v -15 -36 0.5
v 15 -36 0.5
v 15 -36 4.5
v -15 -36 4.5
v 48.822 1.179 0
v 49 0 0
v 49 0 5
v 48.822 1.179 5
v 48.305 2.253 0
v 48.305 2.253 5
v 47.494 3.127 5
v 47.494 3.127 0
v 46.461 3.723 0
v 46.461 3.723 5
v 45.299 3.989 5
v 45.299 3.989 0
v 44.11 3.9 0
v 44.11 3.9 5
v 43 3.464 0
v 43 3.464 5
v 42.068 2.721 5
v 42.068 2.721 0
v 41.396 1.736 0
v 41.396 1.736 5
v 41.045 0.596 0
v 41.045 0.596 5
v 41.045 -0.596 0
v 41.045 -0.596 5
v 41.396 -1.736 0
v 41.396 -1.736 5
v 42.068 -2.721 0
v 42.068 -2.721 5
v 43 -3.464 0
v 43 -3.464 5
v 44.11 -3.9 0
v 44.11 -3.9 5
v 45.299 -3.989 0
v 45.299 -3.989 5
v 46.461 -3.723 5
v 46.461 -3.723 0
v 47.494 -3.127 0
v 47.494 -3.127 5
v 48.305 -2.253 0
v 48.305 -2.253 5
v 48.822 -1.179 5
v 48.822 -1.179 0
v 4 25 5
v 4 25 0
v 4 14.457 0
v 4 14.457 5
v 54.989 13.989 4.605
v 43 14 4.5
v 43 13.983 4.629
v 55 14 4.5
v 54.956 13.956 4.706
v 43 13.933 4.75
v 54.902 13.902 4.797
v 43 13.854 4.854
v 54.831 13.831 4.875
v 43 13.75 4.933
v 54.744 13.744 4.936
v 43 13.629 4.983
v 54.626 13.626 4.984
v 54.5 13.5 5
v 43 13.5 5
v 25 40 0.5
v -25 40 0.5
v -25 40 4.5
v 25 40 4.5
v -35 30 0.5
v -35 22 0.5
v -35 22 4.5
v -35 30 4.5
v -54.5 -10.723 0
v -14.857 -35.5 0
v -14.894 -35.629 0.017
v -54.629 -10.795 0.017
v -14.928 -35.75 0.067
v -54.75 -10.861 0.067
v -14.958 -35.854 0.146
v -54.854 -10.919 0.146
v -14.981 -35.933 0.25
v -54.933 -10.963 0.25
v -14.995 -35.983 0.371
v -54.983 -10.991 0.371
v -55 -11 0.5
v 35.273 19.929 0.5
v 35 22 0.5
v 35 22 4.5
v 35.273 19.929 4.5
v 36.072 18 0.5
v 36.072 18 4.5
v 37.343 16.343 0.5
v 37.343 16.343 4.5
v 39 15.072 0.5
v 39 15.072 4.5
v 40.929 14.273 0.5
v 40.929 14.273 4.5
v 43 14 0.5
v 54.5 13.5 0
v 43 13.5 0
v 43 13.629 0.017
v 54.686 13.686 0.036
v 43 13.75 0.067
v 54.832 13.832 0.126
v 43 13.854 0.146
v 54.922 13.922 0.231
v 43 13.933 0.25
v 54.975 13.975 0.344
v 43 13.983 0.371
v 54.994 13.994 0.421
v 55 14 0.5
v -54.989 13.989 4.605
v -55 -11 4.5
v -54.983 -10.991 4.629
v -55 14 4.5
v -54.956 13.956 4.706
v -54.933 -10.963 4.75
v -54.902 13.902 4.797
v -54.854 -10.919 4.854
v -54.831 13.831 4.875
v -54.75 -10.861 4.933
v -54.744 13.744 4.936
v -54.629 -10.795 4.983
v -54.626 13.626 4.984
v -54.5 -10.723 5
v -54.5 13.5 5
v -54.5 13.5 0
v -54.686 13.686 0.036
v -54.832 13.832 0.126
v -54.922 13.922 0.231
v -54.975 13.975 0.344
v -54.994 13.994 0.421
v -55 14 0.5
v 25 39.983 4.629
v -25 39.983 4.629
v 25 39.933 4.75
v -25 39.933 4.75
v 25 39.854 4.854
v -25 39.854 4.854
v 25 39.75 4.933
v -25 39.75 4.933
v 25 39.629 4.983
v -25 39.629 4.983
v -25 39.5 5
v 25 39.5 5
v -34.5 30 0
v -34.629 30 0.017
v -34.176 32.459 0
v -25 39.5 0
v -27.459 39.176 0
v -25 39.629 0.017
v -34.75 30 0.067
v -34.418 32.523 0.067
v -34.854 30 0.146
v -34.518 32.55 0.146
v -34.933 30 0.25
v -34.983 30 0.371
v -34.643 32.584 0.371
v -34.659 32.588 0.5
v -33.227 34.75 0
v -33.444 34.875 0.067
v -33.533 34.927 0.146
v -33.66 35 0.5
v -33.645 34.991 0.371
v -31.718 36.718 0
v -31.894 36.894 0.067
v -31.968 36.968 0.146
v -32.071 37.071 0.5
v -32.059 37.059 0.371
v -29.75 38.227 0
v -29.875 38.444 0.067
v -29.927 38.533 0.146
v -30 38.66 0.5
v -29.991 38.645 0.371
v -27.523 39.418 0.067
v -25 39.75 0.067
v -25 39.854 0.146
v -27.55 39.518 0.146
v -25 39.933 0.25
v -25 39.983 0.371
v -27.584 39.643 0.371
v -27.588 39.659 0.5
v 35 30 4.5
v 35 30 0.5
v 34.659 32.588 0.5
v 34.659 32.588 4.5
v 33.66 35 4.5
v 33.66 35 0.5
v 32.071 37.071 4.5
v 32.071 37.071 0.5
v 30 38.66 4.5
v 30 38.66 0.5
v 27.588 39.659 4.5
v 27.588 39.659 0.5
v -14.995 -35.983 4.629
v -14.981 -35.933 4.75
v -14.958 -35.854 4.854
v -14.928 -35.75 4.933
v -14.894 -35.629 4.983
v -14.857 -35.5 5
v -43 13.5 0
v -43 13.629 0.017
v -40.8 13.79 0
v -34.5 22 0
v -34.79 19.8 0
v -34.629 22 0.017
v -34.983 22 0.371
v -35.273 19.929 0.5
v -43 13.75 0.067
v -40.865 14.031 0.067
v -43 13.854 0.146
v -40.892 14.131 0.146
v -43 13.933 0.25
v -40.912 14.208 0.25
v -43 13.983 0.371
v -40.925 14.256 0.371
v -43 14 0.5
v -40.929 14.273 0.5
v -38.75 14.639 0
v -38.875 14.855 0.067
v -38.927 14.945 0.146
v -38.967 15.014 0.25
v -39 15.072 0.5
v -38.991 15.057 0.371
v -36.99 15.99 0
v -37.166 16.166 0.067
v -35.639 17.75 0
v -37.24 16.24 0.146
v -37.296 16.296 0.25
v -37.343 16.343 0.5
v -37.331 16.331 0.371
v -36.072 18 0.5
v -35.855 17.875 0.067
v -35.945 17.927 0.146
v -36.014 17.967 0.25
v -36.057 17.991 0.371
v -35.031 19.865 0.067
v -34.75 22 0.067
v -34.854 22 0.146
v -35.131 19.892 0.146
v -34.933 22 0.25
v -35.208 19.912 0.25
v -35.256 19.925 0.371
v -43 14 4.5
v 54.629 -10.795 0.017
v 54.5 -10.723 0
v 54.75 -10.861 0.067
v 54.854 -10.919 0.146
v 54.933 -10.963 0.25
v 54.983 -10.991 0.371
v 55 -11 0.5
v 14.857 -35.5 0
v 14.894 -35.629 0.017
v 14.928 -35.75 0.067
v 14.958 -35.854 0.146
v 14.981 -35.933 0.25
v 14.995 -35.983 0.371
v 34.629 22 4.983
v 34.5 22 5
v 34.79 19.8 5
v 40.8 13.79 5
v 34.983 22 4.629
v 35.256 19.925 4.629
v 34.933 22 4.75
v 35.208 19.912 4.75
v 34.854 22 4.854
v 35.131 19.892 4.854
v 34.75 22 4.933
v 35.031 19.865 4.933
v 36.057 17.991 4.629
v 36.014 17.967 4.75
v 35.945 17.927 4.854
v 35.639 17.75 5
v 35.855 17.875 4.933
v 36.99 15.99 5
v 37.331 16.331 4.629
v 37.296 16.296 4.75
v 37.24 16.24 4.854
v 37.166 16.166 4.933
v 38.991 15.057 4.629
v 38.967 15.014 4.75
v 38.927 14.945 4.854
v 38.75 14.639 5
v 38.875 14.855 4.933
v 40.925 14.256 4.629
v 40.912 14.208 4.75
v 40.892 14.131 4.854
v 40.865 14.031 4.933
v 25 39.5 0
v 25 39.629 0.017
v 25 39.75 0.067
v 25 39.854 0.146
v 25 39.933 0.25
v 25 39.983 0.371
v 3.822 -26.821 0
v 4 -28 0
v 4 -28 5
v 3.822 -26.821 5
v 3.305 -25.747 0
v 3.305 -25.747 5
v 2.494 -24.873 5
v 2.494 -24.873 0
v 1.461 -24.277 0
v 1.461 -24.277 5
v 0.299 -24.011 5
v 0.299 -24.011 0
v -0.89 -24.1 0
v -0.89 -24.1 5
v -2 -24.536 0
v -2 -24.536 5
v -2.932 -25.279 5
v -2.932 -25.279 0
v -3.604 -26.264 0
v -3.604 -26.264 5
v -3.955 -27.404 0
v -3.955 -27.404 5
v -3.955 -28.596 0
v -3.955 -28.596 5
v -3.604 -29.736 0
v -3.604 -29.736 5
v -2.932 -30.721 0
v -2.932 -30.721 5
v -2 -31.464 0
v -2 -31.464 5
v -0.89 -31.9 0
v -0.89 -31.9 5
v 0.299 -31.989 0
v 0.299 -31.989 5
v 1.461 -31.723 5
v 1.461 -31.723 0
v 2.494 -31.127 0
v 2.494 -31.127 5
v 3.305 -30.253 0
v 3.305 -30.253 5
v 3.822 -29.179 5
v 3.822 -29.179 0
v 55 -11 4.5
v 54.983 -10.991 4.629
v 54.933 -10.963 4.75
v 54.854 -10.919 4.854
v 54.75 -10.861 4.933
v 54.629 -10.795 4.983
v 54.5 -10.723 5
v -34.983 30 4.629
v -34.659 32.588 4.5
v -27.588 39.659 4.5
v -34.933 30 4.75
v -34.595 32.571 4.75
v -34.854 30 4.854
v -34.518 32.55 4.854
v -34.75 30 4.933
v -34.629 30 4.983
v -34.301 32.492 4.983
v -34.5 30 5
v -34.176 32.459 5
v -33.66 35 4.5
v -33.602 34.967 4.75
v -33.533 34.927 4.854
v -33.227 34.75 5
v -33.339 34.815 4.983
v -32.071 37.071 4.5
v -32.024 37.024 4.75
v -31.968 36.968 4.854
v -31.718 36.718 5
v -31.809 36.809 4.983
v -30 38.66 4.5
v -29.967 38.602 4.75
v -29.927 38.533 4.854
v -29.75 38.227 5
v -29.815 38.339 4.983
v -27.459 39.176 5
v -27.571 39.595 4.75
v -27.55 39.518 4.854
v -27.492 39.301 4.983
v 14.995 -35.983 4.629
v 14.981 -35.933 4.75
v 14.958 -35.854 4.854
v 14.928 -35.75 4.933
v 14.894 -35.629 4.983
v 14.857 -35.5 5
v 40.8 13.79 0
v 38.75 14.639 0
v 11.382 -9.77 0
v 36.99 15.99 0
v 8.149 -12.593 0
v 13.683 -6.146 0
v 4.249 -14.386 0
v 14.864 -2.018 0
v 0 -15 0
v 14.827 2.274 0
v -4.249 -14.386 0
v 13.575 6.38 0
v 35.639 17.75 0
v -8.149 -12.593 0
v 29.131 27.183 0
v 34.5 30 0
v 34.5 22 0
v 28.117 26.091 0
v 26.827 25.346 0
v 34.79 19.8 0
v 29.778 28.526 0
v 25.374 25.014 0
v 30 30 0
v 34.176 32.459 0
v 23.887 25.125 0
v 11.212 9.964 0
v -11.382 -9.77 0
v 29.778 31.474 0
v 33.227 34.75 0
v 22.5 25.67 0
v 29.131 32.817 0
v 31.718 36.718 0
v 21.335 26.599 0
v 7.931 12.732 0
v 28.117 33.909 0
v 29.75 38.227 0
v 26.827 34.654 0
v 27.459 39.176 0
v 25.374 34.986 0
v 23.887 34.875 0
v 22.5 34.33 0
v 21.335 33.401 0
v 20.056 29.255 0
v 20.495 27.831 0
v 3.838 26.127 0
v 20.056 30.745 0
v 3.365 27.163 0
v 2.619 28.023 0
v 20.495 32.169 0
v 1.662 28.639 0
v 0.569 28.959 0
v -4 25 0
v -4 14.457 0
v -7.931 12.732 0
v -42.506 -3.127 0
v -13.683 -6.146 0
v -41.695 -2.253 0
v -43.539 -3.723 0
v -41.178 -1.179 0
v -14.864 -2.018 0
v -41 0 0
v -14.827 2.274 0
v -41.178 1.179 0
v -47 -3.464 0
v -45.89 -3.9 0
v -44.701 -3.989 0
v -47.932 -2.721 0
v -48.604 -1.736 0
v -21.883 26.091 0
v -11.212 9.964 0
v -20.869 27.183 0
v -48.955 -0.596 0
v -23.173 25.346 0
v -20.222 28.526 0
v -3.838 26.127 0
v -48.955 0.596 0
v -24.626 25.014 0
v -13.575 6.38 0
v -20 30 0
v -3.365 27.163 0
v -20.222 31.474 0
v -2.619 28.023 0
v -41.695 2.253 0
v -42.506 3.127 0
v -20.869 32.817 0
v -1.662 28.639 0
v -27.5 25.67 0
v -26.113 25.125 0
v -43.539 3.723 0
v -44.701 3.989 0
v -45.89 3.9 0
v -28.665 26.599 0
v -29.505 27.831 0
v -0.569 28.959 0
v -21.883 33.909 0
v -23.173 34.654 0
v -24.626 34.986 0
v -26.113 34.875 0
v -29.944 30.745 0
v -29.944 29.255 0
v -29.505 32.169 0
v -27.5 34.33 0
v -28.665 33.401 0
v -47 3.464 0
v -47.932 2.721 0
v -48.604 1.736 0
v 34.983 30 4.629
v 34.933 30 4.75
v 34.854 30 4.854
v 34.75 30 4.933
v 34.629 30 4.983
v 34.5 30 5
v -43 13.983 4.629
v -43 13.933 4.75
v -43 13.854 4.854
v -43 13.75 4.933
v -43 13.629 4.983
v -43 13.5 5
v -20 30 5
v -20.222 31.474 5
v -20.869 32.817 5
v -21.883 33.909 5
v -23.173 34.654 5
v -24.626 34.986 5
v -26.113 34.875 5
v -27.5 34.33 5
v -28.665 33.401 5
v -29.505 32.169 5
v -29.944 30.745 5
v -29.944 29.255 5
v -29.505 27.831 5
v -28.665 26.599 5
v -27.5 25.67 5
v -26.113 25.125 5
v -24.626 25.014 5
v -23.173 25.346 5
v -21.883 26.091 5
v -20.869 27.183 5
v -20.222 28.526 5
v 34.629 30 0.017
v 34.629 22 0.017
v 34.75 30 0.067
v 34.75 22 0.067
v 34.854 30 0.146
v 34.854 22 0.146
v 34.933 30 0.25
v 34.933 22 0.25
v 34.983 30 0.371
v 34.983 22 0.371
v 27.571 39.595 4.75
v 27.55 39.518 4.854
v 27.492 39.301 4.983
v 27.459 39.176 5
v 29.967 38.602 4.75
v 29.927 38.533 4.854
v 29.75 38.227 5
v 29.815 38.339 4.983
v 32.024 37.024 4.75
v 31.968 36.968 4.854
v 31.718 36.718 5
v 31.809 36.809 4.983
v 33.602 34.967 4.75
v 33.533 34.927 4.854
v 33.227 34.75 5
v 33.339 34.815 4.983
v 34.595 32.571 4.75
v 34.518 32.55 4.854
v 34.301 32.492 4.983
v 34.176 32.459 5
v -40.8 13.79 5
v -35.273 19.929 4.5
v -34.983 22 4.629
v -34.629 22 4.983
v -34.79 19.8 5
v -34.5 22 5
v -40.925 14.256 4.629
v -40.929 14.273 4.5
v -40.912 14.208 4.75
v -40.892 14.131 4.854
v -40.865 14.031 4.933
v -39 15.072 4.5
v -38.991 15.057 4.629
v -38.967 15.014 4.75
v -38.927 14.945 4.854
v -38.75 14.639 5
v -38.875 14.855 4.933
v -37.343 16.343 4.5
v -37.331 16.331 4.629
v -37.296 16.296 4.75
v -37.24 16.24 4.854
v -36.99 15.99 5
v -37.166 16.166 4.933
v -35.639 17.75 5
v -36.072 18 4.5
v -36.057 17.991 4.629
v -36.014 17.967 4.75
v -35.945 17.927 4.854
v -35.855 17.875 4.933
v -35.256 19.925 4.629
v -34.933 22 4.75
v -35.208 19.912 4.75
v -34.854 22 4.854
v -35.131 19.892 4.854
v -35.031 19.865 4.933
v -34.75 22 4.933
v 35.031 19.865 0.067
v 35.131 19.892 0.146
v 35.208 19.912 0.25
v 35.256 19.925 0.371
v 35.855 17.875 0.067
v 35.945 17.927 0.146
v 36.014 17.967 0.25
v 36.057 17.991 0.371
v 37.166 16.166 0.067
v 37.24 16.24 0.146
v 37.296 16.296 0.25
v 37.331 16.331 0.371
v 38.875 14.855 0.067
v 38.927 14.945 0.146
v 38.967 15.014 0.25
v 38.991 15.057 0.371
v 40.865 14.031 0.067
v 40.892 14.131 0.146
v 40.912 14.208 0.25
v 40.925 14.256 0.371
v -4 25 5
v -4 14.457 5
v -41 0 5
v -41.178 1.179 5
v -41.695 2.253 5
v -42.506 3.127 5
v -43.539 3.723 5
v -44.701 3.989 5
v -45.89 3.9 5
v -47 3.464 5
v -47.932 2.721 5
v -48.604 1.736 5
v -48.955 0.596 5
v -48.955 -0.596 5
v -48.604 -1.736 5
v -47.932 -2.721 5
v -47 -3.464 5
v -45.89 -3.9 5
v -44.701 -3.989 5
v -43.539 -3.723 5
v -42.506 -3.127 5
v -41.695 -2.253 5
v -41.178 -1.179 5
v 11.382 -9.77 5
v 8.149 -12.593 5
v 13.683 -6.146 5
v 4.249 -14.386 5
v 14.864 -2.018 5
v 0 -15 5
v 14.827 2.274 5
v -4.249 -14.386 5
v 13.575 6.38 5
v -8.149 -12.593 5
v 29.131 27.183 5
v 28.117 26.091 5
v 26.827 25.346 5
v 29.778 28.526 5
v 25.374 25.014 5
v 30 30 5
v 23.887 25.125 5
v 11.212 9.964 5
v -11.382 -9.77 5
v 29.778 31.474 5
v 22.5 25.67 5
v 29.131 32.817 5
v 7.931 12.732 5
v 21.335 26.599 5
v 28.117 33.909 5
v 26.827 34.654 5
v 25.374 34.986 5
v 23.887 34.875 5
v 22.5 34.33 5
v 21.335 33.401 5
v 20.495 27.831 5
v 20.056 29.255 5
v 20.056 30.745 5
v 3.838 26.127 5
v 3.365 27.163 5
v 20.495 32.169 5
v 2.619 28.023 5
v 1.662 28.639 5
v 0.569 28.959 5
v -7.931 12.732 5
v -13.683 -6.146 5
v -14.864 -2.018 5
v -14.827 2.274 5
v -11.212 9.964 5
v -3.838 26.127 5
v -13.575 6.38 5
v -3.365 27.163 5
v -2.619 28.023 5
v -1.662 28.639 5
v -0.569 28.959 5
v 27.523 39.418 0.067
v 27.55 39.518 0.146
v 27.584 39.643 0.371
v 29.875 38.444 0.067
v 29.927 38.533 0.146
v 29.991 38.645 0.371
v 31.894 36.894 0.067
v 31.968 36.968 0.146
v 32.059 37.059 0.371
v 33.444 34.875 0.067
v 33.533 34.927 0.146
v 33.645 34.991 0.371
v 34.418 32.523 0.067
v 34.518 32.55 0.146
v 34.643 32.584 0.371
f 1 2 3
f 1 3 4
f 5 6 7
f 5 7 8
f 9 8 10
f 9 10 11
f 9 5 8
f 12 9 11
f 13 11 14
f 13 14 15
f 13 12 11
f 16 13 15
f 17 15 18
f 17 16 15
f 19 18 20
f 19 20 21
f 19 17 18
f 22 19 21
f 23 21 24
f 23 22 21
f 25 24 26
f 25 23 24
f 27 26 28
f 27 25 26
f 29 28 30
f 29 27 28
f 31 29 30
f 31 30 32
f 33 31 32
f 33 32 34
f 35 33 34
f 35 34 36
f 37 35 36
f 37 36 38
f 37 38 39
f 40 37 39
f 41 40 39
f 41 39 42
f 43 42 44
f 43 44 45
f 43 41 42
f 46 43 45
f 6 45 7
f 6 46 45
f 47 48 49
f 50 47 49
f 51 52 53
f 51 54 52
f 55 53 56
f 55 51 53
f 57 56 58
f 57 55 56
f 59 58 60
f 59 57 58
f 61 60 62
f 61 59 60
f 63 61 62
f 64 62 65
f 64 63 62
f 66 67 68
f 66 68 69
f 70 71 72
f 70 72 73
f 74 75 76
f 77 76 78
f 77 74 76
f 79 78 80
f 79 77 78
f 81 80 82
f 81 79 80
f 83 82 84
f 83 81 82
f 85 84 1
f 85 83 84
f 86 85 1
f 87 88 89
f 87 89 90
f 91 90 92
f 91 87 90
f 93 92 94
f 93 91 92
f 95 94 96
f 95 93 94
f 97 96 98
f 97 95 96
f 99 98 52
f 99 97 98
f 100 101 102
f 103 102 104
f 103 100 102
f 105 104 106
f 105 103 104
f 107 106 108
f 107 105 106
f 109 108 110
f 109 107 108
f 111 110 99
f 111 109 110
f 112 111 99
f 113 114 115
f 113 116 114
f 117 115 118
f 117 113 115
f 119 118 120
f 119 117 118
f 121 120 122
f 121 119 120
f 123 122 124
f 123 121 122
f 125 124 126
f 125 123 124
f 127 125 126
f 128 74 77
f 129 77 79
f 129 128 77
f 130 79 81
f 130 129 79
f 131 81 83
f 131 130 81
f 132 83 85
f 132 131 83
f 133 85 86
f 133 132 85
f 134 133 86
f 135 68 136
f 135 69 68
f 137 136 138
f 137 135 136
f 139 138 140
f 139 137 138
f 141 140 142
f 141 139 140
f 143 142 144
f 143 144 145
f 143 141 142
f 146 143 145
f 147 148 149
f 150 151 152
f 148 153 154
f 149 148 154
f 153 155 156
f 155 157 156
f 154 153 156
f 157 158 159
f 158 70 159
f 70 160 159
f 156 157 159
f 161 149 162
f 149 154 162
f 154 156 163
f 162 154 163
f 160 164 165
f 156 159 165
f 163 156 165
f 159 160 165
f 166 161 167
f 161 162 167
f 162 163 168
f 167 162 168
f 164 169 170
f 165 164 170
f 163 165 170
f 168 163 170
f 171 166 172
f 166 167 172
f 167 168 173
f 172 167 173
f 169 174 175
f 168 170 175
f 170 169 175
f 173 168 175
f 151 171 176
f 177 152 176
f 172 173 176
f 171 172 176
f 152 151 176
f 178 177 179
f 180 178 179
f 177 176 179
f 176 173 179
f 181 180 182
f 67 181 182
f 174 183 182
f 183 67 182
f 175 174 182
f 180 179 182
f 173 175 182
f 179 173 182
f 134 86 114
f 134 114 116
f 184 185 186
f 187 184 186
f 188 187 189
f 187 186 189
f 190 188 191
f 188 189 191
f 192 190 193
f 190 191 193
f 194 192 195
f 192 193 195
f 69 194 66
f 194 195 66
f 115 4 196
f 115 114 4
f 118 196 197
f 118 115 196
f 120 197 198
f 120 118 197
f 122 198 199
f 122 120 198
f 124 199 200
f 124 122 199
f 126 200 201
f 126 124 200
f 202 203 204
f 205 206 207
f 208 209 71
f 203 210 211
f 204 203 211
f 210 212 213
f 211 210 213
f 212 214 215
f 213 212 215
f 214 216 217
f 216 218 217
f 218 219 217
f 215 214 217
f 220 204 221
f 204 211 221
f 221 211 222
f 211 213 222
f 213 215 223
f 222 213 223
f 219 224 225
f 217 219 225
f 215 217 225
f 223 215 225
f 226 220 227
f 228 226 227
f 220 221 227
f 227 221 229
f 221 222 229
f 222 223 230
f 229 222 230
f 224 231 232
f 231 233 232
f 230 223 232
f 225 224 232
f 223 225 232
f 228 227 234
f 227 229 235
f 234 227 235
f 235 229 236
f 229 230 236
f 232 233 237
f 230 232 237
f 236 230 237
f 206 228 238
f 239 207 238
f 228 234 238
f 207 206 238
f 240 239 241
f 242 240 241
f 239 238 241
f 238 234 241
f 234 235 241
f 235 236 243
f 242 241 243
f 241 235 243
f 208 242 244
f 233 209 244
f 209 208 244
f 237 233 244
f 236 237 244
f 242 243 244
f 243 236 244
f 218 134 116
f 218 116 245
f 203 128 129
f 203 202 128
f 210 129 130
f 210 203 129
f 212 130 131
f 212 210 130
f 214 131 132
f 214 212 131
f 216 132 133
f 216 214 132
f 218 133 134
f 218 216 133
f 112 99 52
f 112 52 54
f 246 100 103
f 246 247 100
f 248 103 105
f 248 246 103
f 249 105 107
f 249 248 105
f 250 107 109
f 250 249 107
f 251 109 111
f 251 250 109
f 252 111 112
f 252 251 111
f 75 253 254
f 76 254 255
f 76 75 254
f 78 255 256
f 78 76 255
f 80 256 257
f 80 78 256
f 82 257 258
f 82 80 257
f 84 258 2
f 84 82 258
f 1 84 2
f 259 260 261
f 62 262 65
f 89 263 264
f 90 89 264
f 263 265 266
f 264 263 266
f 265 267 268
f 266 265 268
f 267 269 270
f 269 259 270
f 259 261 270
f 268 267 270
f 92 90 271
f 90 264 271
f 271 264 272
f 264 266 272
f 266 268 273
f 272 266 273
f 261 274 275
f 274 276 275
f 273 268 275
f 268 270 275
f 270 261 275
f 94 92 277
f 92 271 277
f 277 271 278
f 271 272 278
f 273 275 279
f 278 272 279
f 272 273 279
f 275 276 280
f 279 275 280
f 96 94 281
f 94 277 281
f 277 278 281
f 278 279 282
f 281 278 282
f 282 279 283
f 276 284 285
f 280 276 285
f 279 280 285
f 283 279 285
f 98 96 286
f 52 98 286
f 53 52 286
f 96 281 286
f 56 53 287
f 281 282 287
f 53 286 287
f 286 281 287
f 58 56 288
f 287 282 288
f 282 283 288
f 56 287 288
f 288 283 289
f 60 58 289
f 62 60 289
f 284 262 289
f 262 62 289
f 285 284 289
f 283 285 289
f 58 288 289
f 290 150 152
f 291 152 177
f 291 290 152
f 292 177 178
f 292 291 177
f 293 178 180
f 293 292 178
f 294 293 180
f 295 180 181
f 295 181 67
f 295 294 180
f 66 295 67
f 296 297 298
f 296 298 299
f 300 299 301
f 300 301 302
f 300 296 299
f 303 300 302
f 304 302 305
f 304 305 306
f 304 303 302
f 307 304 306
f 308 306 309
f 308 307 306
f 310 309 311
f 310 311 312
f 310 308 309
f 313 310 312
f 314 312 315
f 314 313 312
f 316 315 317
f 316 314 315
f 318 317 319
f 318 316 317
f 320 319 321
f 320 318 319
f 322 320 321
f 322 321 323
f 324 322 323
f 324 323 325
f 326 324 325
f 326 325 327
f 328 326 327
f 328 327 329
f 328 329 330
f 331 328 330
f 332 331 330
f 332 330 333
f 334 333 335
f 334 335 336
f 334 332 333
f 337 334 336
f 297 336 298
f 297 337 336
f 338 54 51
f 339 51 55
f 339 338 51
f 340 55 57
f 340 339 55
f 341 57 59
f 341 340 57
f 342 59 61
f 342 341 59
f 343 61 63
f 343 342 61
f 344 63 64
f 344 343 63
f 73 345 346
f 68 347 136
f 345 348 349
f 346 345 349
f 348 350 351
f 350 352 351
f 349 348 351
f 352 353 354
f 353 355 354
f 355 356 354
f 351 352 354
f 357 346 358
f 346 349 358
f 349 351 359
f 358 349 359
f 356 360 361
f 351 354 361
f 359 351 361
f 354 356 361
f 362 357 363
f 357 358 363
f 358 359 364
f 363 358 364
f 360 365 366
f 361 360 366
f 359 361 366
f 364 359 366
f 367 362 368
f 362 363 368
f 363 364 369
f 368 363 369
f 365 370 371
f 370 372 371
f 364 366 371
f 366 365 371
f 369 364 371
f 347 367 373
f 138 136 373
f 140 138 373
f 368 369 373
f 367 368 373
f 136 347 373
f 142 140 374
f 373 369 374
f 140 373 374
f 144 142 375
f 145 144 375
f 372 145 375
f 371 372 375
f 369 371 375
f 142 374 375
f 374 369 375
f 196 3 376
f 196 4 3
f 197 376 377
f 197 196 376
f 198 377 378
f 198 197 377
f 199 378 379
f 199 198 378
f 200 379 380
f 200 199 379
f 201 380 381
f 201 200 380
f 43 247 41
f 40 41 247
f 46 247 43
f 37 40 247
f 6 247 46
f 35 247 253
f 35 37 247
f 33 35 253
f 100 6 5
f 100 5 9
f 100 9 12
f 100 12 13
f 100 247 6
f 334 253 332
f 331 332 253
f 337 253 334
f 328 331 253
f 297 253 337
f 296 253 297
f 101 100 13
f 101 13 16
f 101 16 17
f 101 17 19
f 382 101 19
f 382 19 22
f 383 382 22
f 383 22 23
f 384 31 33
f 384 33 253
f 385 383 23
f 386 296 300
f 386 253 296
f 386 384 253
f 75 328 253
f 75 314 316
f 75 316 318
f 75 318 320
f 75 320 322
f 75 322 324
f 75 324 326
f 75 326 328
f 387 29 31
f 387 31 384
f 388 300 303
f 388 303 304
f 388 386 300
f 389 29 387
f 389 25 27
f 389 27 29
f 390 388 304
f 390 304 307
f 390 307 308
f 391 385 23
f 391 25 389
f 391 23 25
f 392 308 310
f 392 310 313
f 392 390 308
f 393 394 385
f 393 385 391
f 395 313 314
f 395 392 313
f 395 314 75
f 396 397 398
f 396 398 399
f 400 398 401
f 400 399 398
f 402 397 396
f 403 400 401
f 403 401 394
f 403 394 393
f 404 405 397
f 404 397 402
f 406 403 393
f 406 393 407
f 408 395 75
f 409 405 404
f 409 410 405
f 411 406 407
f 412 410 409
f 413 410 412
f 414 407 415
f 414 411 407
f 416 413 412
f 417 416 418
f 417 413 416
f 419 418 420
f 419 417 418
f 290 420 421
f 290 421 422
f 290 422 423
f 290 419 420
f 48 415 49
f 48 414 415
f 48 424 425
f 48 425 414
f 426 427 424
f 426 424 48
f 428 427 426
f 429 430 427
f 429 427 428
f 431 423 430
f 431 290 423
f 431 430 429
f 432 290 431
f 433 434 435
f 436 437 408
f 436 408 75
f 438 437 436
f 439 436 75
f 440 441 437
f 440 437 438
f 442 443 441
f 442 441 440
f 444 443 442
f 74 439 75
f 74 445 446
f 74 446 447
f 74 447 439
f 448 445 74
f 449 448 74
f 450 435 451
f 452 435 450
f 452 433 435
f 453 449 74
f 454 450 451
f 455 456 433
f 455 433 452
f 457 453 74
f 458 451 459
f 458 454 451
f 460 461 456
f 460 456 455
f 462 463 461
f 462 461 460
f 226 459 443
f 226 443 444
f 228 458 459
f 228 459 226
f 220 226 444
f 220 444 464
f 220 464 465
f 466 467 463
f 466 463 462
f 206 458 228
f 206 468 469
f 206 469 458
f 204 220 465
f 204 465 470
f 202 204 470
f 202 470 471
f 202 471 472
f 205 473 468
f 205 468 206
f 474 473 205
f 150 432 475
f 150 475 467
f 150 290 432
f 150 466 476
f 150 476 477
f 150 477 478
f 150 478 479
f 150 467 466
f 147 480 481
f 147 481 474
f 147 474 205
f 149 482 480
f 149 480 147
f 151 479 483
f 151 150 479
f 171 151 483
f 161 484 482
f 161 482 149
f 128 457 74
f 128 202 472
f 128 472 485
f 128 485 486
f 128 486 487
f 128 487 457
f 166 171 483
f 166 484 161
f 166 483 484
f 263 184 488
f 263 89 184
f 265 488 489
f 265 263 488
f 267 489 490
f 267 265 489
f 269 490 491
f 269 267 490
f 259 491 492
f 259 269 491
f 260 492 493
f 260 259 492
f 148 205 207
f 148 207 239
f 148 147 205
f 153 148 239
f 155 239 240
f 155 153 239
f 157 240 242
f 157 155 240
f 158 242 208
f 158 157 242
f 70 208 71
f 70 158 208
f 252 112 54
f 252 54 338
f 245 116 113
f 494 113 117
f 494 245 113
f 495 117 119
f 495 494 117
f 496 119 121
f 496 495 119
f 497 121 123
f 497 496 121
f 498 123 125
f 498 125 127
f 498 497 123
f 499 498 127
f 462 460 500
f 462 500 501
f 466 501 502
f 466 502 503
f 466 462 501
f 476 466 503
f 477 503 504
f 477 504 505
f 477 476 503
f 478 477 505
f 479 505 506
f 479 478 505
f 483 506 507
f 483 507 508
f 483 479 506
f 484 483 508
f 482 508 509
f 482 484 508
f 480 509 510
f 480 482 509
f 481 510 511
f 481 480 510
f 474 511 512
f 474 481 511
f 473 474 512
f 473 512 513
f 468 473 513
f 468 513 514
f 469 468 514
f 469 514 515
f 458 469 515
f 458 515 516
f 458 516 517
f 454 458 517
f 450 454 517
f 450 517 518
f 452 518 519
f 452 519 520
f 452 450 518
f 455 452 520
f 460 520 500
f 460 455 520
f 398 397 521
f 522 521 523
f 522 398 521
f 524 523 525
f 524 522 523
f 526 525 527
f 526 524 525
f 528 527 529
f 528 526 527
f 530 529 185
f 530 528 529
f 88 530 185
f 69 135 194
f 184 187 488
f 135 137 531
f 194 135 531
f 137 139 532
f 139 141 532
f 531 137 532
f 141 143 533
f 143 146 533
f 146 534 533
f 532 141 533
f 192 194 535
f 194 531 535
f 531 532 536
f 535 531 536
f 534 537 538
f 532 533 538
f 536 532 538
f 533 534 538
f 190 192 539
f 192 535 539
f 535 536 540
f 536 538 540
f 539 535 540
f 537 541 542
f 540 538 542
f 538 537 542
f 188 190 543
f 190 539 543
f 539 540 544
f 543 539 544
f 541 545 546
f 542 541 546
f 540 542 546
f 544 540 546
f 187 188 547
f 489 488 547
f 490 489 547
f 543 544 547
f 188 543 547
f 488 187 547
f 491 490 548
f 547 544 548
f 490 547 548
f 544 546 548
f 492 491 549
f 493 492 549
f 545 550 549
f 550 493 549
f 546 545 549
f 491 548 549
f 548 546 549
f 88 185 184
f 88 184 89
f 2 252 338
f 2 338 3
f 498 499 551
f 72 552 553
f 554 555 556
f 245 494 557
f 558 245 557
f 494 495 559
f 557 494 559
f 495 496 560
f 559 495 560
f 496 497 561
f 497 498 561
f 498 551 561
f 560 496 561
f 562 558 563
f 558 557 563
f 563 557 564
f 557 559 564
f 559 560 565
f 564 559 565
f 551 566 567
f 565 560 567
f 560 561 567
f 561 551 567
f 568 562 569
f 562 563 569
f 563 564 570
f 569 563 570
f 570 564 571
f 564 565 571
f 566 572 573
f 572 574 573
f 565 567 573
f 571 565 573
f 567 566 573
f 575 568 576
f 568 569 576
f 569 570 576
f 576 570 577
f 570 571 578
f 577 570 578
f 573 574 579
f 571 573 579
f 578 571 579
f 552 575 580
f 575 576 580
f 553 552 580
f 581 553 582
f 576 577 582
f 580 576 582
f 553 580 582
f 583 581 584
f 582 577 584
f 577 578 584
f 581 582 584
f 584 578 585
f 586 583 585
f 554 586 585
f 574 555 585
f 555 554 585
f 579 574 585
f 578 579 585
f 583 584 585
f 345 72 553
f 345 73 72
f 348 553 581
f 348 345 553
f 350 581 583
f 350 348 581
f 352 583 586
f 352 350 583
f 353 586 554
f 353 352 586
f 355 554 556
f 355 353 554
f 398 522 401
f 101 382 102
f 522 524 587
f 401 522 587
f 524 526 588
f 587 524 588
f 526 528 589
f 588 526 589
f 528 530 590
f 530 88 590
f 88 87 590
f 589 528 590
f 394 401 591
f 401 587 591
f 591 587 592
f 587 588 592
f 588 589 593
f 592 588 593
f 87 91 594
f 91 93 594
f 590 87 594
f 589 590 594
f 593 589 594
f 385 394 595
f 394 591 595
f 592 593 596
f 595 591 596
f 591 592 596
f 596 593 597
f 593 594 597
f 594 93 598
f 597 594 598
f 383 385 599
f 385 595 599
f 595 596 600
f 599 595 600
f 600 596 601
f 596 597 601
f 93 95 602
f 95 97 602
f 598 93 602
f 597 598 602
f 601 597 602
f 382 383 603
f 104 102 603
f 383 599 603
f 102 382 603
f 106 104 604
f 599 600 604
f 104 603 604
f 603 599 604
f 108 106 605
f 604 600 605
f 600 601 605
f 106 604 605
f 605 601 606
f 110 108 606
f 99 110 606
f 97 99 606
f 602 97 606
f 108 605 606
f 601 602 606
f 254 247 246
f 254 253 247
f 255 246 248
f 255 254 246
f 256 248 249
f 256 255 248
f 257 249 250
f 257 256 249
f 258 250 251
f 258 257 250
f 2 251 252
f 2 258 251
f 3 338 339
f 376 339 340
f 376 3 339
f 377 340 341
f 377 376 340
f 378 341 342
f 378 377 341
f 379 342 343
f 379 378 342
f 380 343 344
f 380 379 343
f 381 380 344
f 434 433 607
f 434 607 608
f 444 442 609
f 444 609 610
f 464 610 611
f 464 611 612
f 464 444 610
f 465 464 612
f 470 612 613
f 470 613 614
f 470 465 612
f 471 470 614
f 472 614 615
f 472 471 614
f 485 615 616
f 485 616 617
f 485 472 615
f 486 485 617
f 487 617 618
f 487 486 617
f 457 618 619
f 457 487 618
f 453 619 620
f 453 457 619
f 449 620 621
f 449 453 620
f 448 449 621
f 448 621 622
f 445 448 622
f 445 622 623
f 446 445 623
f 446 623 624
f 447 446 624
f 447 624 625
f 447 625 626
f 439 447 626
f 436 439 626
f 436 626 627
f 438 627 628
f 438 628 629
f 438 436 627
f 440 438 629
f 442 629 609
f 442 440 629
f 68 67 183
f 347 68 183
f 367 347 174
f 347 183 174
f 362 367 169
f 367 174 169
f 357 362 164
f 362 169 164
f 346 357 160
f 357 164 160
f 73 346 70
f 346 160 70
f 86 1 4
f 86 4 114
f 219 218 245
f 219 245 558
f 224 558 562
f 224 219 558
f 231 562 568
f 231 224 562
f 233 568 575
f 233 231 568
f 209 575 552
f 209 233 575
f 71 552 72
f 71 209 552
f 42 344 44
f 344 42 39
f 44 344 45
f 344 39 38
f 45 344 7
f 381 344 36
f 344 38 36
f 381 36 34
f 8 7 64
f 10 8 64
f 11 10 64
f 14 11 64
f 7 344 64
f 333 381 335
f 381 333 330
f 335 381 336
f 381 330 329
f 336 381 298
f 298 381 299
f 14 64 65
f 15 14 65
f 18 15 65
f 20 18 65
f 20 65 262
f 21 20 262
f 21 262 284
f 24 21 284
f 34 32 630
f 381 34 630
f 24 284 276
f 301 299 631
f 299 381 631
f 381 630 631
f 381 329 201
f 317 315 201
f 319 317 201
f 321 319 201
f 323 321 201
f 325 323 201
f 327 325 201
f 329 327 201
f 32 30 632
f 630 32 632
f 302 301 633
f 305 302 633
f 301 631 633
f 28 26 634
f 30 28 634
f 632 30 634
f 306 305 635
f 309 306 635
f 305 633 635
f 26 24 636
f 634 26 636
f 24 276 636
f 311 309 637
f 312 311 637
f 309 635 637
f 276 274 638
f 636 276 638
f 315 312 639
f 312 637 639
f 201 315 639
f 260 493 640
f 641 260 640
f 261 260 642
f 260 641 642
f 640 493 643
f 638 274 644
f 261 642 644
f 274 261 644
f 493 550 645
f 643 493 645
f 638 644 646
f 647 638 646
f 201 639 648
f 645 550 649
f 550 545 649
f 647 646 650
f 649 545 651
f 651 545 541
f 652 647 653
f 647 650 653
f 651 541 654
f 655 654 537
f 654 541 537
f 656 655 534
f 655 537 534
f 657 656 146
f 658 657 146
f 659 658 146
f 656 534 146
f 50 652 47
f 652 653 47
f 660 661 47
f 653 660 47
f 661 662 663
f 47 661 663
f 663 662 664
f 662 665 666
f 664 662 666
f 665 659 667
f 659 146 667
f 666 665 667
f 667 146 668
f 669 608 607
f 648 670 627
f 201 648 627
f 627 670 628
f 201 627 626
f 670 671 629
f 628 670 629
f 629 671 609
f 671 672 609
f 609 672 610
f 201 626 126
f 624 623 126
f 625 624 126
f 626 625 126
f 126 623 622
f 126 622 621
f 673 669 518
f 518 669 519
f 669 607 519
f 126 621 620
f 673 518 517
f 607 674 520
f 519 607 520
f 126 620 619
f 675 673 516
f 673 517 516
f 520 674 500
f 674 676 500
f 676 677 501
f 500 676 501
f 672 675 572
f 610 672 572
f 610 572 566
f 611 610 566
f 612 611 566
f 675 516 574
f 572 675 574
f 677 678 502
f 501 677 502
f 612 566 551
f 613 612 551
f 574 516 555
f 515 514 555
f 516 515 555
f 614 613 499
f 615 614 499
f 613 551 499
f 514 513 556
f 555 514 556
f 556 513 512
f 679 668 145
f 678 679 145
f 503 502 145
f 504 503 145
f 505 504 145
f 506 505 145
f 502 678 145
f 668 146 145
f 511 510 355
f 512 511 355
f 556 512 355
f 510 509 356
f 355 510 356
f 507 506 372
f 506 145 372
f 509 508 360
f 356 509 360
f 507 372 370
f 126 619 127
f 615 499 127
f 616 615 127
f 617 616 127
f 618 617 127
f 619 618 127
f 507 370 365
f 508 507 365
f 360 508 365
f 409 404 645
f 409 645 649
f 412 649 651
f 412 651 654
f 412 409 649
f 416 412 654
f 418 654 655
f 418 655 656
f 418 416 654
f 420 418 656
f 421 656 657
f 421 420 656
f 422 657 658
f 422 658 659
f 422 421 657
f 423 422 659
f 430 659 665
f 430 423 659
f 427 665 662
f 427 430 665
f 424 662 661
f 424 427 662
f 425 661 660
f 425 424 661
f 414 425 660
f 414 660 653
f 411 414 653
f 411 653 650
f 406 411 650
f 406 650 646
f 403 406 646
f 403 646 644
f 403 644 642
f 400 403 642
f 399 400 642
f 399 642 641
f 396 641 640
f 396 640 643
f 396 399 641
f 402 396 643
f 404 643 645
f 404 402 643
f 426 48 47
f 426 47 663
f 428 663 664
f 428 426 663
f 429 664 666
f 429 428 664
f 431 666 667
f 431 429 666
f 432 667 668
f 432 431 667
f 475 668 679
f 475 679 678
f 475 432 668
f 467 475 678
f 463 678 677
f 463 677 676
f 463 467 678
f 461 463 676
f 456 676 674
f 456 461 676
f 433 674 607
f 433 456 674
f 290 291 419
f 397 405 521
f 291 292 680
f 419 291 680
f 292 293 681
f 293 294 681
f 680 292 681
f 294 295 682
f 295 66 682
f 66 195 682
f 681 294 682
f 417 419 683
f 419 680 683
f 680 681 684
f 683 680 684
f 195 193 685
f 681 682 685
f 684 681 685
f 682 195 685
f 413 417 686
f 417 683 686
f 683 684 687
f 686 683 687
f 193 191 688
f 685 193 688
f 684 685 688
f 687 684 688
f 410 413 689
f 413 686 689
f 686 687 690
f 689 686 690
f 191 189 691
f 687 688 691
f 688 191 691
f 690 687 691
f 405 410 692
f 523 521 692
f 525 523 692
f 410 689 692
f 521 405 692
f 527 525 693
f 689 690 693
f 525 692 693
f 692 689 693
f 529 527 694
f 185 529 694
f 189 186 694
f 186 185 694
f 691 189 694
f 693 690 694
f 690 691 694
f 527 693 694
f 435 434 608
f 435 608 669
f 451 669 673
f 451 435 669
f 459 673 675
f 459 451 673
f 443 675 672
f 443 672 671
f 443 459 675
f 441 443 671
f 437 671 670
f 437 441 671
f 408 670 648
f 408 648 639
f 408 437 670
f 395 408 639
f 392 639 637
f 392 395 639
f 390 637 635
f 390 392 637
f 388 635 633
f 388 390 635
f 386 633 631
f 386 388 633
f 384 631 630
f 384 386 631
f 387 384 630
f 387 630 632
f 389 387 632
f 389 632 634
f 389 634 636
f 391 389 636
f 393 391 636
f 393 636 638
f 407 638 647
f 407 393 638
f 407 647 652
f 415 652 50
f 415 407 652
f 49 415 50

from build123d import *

# Parameters (mm, degrees)
SKETCH_R    = 4
SKETCH_R_2  = 5
PAD_DEPTH   = 5
FILLET_R    = 0.5
FILLET001_R = 0.5


with BuildPart() as part:
    # Sketch → Pad (new body)
    with BuildSketch(Plane.XY):
        with BuildLine():
            Line((-25, 40), (25, 40))
            ThreePointArc((35, 30), (32.071068, 37.071068), (25, 40))
            Line((35, 30), (35, 22))
            ThreePointArc((35, 22), (37.343146, 16.343146), (43, 14))
            Line((43, 14), (55, 14))
            Line((55, 14), (55, -11))
            Line((55, -11), (15, -36))
            Line((15, -36), (-15, -36))
            Line((-15, -36), (-55, -11))
            Line((-55, -11), (-55, 14))
            Line((-55, 14), (-43, 14))
            ThreePointArc((-43, 14), (-37.343146, 16.343146), (-35, 22))
            Line((-35, 22), (-35, 30))
            ThreePointArc((-25, 40), (-32.071068, 37.071068), (-35, 30))
        make_face()
        with Locations((0, -28)):
            Circle(SKETCH_R, mode=Mode.SUBTRACT)
        with Locations((45, 0)):
            Circle(SKETCH_R, mode=Mode.SUBTRACT)
        with Locations((-45, 0)):
            Circle(SKETCH_R, mode=Mode.SUBTRACT)
        with Locations((25, 30)):
            Circle(SKETCH_R_2, mode=Mode.SUBTRACT)
        with Locations((-25, 30)):
            Circle(SKETCH_R_2, mode=Mode.SUBTRACT)
        with BuildLine():
            ThreePointArc((-4, 14.456832), (0, -15), (4, 14.456832))
            Line((4, 25), (4, 14.456832))
            ThreePointArc((4, 25), (0, 29), (-4, 25))
            Line((-4, 25), (-4, 14.456832))
        make_face(mode=Mode.SUBTRACT)
    extrude(amount=PAD_DEPTH)

    # Fillet
    fillet_edges = [part.edges().sort_by_distance(p)[0] for p in [
        (-55, 1.5, 5),
        (-35, -23.5, 5),
        (0, -36, 5),
        (35, -23.5, 5),
        (55, 1.5, 5),
        (49, 14, 5),
        (37.343146, 16.343146, 5),
        (35, 26, 5),
        (32.071068, 37.071068, 5),
        (0, 40, 5),
        (-32.071068, 37.071068, 5),
        (-35, 26, 5),
        (-37.343146, 16.343146, 5),
        (-49, 14, 5),
    ]]
    fillet(fillet_edges, radius=FILLET_R)

    # Fillet001
    fillet001_edges = [part.edges().sort_by_distance(p)[0] for p in [
        (0, -36, 0),
        (-35, -23.5, 0),
        (-55, 1.5, 0),
        (-49, 14, 0),
        (-37.343146, 16.343146, 0),
        (-35, 26, 0),
        (-32.071068, 37.071068, 0),
        (0, 40, 0),
        (32.071068, 37.071068, 0),
        (35, 26, 0),
        (37.343146, 16.343146, 0),
        (49, 14, 0),
        (55, 1.5, 0),
        (35, -23.5, 0),
    ]]
    fillet(fillet001_edges, radius=FILLET001_R)


solid = part.part
